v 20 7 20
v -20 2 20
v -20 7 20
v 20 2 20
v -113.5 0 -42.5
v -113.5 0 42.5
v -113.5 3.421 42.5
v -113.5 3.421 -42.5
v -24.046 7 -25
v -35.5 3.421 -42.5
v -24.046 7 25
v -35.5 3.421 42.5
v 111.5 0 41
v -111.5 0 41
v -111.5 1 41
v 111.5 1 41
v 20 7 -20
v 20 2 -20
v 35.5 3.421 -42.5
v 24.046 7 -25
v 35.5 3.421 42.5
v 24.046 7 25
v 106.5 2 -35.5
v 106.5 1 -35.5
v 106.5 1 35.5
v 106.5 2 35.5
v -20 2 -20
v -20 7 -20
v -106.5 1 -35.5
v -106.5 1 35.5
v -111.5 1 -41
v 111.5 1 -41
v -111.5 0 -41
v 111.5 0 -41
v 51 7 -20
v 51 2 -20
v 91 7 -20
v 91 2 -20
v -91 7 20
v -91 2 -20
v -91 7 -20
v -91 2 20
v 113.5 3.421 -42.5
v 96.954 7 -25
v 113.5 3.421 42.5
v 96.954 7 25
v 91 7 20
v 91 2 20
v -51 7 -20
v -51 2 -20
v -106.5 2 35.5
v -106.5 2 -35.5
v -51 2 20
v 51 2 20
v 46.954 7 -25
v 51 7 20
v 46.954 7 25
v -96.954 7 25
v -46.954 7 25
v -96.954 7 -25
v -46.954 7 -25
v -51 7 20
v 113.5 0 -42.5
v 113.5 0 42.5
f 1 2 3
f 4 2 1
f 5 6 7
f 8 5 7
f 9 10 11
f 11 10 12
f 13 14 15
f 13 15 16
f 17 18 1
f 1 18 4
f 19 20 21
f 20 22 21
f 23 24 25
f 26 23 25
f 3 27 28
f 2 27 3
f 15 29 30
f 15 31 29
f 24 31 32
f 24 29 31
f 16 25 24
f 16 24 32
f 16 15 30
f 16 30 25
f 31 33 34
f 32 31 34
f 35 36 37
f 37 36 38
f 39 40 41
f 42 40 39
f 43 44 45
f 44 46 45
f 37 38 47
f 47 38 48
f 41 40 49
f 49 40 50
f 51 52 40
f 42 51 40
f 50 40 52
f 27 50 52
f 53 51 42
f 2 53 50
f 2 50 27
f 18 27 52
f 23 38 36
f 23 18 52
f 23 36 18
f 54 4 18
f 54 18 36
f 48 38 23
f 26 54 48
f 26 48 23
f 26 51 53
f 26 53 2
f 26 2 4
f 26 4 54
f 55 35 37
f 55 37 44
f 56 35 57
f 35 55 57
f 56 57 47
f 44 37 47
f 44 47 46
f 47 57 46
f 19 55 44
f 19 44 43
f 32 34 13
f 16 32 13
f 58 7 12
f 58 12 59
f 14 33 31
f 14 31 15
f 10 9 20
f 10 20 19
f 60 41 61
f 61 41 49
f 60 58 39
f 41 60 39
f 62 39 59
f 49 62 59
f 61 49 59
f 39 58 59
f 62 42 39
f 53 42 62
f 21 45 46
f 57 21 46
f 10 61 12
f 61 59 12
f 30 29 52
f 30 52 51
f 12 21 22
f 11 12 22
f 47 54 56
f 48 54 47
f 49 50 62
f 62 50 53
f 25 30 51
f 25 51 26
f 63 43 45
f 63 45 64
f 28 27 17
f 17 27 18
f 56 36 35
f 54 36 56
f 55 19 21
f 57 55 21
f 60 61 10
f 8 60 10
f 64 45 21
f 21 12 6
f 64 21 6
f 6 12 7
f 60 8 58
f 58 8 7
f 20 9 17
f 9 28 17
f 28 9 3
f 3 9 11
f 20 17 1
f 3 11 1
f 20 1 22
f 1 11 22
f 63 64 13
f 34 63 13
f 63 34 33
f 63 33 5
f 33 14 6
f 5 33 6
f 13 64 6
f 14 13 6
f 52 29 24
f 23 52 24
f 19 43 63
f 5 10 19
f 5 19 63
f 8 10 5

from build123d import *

# Parameters (mm, degrees)
EXTRUDE_1_DEPTH     = 42.5
SKETCH_2_OUTSIDE_W  = 135.498
SKETCH_2_OUTSIDE_H  = 57.498
CUT_EXTRUDE_1_DEPTH = 123
SKETCH_3_W          = 40
SKETCH_3_H          = 40
CUT_EXTRUDE_2_DEPTH = 8
SKETCH_4_W          = 223
SKETCH_4_H          = 82
CUT_EXTRUDE_3_DEPTH = 1
SKETCH_5_W          = 213
SKETCH_5_H          = 71
CUT_EXTRUDE_4_DEPTH = 1


with BuildPart() as part:
    # Эскиз1 → Бобышка-Вытянуть1 (new body, symmetric)
    with BuildSketch(Plane.XY):
        Polygon((-113.5, 0), (-113.5, 3.420983787), (-96.95384839, 7), (-46.95384839, 7), (-35.5, 3.420983787), (-24.04615161, 7), (24.04615161, 7), (35.5, 3.420983787), (46.95384839, 7), (96.95384839, 7), (113.5, 3.420983787), (113.5, 0), align=None)
    extrude(amount=EXTRUDE_1_DEPTH, both=True)

    # Эскиз2 outside → Вырез-Вытянуть1 (cut, symmetric)
    with BuildSketch(Plane(origin=(0, 0, 0), x_dir=(0, 0, -1), z_dir=(1, 0, 0))):
        with Locations((0, 3.5)):
            Rectangle(SKETCH_2_OUTSIDE_W, SKETCH_2_OUTSIDE_H)
        Polygon((42.5, 0), (-42.5, 0), (-42.5, 3.420983787), (-25, 7), (25, 7), (42.5, 3.420983787), align=None, mode=Mode.SUBTRACT)
    extrude(amount=CUT_EXTRUDE_1_DEPTH, both=True, mode=Mode.SUBTRACT)

    # Эскиз3 → Вырез-Вытянуть2 (cut, through all)
    with BuildSketch(Plane.XZ):
        with Locations((71, 0)):
            Rectangle(SKETCH_3_W, SKETCH_3_H)
        Rectangle(SKETCH_3_W, SKETCH_3_H)
        with Locations((-71, 0)):
            Rectangle(SKETCH_3_W, SKETCH_3_H)
    extrude(amount=-CUT_EXTRUDE_2_DEPTH, mode=Mode.SUBTRACT)

    # Эскиз4 → Вырез-Вытянуть3 (cut)
    with BuildSketch(Plane.XZ):
        Rectangle(SKETCH_4_W, SKETCH_4_H)
    extrude(amount=-CUT_EXTRUDE_3_DEPTH, mode=Mode.SUBTRACT)

    # Эскиз5 → Вырез-Вытянуть4 (cut)
    with BuildSketch(Plane.XZ.offset(-1)):
        Rectangle(SKETCH_5_W, SKETCH_5_H)
    extrude(amount=-CUT_EXTRUDE_4_DEPTH, mode=Mode.SUBTRACT)


solid = part.part
